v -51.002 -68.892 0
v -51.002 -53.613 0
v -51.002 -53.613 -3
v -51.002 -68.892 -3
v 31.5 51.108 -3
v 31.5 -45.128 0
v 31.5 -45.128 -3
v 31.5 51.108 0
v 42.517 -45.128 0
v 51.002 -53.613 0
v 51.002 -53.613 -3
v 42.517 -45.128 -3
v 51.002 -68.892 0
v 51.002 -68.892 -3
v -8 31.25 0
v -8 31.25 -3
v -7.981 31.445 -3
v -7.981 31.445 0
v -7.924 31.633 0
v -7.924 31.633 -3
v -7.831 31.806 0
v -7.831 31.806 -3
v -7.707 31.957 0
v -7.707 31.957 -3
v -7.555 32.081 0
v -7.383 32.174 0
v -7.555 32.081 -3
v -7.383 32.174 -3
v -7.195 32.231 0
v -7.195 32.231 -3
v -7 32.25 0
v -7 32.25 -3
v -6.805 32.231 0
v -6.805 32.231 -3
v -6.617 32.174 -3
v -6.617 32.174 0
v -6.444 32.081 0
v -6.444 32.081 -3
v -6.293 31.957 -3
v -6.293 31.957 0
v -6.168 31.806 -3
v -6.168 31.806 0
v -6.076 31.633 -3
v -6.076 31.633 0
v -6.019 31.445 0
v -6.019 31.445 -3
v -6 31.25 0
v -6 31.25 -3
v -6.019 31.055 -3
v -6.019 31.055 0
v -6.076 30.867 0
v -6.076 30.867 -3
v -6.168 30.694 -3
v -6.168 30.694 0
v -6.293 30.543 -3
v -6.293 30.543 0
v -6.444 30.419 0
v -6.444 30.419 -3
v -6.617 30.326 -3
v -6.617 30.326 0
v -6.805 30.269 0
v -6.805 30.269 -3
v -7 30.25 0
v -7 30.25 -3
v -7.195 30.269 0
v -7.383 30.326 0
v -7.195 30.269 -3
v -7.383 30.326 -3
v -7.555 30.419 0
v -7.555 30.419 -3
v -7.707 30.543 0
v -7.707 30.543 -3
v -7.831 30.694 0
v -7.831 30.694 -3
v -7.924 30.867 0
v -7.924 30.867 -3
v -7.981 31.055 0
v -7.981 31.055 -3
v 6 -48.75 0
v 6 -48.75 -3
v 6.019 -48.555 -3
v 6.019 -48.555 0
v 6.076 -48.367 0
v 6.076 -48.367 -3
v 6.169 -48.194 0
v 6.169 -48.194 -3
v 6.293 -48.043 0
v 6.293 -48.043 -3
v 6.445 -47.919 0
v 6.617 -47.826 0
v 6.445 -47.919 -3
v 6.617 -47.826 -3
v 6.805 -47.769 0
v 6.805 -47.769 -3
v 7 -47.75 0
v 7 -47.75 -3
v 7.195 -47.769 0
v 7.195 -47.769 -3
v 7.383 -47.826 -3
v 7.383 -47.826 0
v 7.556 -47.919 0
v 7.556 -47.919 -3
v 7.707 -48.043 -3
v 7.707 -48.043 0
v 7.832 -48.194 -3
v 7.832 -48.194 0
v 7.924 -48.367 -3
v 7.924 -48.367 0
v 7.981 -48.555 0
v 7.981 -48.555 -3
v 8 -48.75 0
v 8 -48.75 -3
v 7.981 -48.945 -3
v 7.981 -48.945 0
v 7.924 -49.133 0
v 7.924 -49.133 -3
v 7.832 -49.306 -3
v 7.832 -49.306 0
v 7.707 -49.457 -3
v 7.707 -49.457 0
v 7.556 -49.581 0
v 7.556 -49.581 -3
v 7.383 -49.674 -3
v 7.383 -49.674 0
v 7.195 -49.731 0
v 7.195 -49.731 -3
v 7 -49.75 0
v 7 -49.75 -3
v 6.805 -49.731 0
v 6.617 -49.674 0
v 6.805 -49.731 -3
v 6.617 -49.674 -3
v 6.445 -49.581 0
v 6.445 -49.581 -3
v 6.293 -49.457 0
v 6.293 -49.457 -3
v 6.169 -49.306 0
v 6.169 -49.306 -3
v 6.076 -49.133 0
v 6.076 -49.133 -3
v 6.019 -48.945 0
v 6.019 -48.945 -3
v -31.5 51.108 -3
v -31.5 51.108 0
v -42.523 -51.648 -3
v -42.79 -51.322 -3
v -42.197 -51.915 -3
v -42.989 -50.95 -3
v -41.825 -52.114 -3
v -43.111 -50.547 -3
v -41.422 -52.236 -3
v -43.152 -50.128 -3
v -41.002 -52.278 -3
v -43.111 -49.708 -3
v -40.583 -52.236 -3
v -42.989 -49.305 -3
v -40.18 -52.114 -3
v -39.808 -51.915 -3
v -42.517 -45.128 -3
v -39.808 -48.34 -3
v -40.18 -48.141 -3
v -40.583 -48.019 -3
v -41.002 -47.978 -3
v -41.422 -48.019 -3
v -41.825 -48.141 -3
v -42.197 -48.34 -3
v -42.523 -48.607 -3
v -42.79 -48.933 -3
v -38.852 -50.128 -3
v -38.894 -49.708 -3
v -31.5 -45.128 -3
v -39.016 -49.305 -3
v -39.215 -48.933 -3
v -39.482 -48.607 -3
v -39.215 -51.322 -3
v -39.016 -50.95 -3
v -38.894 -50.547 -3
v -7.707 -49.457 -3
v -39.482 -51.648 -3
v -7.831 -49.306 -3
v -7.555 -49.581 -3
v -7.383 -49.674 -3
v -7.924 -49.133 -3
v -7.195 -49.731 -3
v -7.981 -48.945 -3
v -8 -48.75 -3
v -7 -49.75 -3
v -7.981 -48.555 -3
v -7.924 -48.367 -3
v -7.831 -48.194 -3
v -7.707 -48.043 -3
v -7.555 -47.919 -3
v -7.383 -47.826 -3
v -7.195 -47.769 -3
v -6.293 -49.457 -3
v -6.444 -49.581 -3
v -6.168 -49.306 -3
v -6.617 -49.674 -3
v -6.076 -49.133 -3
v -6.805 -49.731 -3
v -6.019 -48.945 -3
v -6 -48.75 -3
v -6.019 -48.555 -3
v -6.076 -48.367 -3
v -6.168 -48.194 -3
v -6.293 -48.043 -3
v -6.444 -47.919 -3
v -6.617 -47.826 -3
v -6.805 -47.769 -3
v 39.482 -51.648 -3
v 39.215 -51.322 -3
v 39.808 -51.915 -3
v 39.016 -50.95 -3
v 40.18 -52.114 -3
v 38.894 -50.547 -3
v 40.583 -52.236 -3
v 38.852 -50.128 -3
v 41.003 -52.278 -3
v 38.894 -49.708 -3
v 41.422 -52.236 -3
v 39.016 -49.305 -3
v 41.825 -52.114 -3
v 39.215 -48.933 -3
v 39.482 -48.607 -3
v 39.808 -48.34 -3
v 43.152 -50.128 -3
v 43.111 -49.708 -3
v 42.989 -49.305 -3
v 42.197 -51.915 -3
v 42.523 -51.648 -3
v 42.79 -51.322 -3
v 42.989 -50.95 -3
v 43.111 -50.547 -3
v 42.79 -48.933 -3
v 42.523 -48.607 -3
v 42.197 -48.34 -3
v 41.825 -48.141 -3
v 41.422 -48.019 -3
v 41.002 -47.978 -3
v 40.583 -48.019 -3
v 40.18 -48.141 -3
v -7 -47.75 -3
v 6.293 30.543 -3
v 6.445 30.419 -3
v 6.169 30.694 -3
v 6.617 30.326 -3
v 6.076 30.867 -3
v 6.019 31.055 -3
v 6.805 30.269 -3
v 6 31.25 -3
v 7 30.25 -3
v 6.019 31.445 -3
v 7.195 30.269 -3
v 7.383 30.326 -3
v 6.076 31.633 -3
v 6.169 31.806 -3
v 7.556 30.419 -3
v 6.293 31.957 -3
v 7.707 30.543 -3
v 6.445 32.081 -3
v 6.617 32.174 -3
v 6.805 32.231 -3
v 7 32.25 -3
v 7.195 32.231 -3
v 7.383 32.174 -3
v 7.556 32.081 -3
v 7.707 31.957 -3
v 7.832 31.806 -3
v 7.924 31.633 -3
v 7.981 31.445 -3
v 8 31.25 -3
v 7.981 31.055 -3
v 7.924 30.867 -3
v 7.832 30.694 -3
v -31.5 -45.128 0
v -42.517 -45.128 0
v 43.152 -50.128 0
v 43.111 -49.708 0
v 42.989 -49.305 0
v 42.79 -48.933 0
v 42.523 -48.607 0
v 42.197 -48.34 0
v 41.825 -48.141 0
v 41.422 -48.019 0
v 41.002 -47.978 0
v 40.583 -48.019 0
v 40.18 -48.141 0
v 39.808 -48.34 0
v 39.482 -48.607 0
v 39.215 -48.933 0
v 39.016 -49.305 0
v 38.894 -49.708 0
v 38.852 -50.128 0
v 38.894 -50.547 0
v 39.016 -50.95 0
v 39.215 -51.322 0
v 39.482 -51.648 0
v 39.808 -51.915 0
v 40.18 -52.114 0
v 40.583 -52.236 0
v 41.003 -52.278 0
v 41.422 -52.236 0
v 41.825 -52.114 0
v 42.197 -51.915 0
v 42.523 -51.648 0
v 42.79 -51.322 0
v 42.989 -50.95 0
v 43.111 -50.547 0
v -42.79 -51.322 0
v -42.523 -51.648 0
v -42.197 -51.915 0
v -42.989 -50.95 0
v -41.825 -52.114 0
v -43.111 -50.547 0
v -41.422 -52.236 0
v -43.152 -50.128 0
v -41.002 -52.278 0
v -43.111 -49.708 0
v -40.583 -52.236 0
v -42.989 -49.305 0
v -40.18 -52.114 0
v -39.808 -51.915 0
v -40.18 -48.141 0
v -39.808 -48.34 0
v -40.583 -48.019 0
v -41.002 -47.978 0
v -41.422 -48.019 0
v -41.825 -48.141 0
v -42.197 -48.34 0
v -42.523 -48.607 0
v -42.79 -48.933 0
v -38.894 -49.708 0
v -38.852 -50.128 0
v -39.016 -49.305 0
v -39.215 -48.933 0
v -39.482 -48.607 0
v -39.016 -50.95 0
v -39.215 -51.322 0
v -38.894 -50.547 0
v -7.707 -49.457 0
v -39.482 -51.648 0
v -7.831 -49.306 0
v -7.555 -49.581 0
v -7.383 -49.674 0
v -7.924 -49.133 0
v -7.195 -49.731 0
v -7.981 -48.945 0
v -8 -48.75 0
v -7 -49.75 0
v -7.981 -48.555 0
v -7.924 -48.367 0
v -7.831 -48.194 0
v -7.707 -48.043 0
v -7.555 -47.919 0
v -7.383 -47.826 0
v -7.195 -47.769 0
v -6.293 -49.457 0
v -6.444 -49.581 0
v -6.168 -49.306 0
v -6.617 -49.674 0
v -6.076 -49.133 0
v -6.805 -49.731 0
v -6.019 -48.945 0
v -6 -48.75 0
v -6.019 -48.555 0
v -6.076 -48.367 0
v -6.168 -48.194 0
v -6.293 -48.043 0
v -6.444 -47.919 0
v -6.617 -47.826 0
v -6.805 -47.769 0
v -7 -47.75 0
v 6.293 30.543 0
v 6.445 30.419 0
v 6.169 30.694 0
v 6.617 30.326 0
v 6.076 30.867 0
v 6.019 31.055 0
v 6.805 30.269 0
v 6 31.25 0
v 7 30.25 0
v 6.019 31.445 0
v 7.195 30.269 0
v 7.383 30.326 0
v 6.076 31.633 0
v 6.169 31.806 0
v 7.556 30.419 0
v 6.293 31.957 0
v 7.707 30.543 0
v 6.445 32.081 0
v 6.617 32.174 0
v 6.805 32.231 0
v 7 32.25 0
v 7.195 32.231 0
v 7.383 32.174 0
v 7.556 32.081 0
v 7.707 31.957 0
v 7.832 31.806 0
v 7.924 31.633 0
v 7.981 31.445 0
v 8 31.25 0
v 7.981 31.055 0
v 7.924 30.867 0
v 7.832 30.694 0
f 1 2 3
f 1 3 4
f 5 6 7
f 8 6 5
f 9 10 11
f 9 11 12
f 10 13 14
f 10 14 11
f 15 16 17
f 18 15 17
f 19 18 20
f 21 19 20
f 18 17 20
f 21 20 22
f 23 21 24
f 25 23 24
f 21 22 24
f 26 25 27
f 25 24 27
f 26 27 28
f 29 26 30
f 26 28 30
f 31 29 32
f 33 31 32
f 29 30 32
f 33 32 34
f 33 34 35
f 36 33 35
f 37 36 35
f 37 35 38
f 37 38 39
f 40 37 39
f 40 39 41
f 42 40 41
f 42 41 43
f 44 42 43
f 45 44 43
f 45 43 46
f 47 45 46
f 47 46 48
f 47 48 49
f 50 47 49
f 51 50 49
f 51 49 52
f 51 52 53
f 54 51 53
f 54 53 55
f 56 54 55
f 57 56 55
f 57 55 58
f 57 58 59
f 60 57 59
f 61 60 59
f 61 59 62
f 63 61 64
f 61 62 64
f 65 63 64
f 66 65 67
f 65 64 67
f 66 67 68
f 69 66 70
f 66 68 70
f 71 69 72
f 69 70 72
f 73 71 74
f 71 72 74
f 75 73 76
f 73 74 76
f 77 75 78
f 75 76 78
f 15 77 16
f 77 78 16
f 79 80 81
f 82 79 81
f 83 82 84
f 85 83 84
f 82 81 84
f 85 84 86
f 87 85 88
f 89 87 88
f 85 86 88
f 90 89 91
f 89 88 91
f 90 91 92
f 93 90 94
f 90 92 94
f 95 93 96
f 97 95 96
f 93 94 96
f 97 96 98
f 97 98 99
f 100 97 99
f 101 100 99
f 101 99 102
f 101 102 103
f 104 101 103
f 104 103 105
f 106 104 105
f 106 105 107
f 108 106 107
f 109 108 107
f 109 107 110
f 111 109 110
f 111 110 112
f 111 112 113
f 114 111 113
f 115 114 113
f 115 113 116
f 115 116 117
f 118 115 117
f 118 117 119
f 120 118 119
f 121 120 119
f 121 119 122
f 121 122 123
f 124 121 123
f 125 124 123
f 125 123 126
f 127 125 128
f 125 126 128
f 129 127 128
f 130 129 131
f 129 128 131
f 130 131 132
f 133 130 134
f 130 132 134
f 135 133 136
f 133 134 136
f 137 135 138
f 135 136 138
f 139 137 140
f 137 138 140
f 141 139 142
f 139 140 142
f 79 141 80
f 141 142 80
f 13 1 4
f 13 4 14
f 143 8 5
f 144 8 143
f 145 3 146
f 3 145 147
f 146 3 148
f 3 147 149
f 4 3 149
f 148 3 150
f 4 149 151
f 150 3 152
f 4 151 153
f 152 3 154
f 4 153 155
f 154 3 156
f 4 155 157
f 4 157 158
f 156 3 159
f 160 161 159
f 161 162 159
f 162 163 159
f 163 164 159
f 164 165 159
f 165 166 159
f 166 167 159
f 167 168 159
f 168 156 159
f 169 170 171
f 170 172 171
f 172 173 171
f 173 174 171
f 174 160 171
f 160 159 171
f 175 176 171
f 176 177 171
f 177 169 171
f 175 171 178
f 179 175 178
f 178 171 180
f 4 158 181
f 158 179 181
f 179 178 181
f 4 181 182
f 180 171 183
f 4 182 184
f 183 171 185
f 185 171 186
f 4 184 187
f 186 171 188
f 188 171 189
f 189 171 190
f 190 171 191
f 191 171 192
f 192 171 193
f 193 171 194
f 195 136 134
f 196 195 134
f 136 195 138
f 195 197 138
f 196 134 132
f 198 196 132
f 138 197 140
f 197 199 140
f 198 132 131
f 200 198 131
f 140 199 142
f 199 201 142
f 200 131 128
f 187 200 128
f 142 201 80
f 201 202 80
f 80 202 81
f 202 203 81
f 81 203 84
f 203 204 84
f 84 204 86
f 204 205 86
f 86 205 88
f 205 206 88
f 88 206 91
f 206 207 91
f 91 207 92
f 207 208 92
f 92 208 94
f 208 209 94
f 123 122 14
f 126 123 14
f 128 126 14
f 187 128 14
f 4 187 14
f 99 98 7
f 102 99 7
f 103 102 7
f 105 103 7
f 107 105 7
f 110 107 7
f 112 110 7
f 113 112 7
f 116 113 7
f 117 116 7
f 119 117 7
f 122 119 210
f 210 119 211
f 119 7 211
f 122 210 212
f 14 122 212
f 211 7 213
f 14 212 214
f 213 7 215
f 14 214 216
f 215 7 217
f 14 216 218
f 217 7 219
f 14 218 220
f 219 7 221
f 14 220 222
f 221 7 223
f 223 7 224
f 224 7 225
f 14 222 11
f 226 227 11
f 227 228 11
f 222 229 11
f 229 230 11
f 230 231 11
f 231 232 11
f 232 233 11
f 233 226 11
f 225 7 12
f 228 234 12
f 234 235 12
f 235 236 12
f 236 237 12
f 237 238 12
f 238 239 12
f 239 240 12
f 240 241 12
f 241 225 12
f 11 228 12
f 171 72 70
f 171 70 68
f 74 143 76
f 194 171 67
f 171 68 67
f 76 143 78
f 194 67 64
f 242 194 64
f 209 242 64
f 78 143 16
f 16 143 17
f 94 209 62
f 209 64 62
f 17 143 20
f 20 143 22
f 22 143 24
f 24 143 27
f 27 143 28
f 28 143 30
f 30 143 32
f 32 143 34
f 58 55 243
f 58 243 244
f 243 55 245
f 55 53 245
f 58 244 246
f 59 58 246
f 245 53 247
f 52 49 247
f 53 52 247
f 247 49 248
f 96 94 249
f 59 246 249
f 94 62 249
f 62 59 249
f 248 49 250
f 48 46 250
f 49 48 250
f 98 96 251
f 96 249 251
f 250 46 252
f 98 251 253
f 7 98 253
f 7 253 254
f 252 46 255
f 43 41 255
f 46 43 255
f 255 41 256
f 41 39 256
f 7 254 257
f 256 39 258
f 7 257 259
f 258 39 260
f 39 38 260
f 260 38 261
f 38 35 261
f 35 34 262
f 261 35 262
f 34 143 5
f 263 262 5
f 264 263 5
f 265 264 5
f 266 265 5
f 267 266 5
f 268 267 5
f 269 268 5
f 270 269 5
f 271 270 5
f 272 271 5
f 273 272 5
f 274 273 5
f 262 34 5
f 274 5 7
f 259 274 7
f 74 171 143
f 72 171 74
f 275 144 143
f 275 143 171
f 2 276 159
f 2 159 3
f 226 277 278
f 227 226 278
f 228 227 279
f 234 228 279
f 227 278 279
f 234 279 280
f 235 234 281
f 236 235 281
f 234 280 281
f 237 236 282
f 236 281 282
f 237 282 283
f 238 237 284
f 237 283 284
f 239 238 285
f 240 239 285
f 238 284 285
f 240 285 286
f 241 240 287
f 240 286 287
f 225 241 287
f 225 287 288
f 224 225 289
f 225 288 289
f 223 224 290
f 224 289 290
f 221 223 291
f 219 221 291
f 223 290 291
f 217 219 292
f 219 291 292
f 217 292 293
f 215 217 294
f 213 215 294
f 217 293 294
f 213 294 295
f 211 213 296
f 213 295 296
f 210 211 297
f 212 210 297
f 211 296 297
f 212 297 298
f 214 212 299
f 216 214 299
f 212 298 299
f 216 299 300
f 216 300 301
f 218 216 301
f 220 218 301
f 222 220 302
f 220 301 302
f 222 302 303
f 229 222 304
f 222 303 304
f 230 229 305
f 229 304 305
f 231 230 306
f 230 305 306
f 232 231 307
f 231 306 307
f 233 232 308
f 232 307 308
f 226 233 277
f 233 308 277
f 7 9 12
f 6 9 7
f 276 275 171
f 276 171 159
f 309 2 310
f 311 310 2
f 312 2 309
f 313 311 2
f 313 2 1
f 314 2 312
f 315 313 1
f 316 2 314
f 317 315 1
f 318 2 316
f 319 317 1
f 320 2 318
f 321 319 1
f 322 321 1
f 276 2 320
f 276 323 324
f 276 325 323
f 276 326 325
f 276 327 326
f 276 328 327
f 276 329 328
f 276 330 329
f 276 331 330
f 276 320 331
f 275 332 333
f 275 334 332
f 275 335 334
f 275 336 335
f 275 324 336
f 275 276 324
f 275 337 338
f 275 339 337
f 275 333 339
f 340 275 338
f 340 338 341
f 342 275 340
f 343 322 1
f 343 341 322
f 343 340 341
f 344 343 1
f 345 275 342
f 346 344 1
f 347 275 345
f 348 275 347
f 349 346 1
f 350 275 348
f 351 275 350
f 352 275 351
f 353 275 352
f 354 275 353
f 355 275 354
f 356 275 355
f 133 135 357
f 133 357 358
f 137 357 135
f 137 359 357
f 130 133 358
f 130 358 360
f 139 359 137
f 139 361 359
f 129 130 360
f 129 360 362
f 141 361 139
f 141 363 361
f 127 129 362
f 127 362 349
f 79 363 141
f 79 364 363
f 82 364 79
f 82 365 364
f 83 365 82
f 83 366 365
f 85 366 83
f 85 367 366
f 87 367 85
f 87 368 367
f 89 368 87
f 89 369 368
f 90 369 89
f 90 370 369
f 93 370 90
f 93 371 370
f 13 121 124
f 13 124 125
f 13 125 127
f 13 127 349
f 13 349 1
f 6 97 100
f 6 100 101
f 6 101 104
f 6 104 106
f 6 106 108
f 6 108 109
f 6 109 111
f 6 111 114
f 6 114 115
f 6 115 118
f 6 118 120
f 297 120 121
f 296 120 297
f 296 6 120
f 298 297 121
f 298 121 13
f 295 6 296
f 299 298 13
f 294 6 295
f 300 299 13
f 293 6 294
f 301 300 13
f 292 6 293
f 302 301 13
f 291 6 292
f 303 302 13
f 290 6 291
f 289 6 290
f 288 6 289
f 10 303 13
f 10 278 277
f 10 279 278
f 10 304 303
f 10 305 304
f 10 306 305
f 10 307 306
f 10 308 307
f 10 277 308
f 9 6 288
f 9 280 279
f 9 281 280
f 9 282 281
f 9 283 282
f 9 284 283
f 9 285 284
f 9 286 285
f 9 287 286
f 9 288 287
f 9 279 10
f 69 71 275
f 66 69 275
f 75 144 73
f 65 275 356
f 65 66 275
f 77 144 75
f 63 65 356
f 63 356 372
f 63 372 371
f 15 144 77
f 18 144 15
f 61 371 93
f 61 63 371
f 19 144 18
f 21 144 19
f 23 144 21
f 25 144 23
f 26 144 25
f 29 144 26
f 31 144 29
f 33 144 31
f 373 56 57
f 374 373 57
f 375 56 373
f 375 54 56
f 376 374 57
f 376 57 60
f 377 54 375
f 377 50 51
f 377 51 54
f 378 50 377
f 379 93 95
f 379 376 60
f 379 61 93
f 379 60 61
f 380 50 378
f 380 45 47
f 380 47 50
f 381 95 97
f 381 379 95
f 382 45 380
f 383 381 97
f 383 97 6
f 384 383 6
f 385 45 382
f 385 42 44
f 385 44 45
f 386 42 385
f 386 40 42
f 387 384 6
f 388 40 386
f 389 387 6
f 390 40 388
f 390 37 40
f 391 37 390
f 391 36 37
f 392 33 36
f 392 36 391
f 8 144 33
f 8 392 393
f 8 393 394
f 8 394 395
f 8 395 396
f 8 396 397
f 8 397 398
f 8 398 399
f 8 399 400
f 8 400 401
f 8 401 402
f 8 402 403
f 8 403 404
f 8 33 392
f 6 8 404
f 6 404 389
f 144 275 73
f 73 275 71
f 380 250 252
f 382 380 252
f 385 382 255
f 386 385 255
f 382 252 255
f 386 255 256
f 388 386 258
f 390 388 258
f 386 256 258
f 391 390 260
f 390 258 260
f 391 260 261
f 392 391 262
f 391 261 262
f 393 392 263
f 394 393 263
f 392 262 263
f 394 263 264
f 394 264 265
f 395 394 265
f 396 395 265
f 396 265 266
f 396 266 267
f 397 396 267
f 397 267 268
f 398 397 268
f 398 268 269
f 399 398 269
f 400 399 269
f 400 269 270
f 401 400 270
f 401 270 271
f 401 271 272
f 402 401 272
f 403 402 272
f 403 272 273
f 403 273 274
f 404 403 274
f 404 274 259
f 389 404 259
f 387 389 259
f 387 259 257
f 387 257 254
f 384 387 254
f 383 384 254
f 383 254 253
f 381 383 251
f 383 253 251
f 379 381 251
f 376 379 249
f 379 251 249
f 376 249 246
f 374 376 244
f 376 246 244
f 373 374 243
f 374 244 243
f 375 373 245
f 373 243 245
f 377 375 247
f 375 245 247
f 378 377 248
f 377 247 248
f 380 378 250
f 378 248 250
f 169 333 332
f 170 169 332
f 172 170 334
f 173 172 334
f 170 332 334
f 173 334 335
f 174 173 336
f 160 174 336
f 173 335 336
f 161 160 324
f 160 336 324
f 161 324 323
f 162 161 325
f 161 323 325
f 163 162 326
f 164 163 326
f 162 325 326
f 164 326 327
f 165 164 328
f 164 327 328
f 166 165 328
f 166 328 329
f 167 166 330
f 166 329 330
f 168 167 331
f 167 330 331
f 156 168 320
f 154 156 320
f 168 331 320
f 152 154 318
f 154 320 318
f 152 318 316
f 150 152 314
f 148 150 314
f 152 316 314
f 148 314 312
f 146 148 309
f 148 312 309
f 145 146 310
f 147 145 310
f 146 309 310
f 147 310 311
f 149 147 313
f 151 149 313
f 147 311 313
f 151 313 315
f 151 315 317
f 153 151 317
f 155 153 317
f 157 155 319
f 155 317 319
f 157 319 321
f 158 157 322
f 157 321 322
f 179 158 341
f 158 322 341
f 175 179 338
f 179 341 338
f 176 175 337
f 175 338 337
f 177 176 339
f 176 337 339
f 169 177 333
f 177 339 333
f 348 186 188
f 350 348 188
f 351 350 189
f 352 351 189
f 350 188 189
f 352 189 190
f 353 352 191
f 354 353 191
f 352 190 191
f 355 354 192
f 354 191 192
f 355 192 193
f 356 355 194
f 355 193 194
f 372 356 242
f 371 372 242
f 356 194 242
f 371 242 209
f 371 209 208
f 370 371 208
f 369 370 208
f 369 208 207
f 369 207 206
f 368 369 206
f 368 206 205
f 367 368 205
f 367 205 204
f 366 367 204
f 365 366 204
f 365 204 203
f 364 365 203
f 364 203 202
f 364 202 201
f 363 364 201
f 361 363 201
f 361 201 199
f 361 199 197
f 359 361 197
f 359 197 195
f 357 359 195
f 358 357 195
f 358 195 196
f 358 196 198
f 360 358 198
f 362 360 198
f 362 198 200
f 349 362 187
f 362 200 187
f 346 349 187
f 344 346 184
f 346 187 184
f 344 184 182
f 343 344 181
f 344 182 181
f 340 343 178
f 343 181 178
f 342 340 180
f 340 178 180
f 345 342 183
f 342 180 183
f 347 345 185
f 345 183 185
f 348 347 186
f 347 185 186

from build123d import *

# Parameters (mm, degrees)
EXTRUDE_1_DEPTH     = 3
SKETCH_2_R          = 2.15
CUT_EXTRUDE_1_DEPTH = 3
SKETCH_3_R          = 1
CUT_EXTRUDE_2_DEPTH = 70
CUT_EXTRUDE1_DEPTH  = 10


with BuildPart() as part:
    # 草图1 → 凸台-拉伸1 (new body)
    with BuildSketch(Plane.XY):
        Polygon((-51.0025, -68.891882816), (51.0025, -68.891882816), (51.0025, 35.266689181), (40.10963441, 51.108117184), (-37.096440595, 51.108117184), (-51.0025, 41.546047656), align=None)
    extrude(amount=-EXTRUDE_1_DEPTH)

    # 草图2 → 切除-拉伸1 (cut)
    with BuildSketch(Plane.XY):
        with Locations((-41.0025, 9.872461287)):
            Circle(SKETCH_2_R)
        with Locations((-41.0025, -50.127538712)):
            Circle(SKETCH_2_R)
        with Locations((41.0025, 9.872461287)):
            Circle(SKETCH_2_R)
        with Locations((41.0025, -50.127538712)):
            Circle(SKETCH_2_R)
    extrude(amount=-CUT_EXTRUDE_1_DEPTH, mode=Mode.SUBTRACT)

    # 草图3 → 切除-拉伸2 (cut)
    with BuildSketch(Plane(origin=(0, 0, -3), x_dir=(-1, 0, 0), z_dir=(0, 0, -1))):
        with Locations((-7.000166, 31.25)):
            Circle(SKETCH_3_R)
        with Locations((6.999834, 31.25)):
            Circle(SKETCH_3_R)
        with Locations((-7.000166, -48.75)):
            Circle(SKETCH_3_R)
        with Locations((6.999834, -48.75)):
            Circle(SKETCH_3_R)
    extrude(amount=-CUT_EXTRUDE_2_DEPTH, mode=Mode.SUBTRACT)

    # Sketch1 → Cut-Extrude1 (cut)
    with BuildSketch(Plane.XY):
        Polygon((51.0025, -53.612820087), (42.517218626, -45.127538713), (31.499996481, -45.127538713), (31.499964702, 63.629107338), (51.0025, 63.629107338), align=None)
        Polygon((-31.499999356, -45.127538713), (-42.517218626, -45.127538713), (-51.0025, -53.612820087), (-51.0025, 54.95635915), (-31.499965771, 54.95635915), align=None)
    extrude(amount=-CUT_EXTRUDE1_DEPTH, mode=Mode.SUBTRACT)


solid = part.part
